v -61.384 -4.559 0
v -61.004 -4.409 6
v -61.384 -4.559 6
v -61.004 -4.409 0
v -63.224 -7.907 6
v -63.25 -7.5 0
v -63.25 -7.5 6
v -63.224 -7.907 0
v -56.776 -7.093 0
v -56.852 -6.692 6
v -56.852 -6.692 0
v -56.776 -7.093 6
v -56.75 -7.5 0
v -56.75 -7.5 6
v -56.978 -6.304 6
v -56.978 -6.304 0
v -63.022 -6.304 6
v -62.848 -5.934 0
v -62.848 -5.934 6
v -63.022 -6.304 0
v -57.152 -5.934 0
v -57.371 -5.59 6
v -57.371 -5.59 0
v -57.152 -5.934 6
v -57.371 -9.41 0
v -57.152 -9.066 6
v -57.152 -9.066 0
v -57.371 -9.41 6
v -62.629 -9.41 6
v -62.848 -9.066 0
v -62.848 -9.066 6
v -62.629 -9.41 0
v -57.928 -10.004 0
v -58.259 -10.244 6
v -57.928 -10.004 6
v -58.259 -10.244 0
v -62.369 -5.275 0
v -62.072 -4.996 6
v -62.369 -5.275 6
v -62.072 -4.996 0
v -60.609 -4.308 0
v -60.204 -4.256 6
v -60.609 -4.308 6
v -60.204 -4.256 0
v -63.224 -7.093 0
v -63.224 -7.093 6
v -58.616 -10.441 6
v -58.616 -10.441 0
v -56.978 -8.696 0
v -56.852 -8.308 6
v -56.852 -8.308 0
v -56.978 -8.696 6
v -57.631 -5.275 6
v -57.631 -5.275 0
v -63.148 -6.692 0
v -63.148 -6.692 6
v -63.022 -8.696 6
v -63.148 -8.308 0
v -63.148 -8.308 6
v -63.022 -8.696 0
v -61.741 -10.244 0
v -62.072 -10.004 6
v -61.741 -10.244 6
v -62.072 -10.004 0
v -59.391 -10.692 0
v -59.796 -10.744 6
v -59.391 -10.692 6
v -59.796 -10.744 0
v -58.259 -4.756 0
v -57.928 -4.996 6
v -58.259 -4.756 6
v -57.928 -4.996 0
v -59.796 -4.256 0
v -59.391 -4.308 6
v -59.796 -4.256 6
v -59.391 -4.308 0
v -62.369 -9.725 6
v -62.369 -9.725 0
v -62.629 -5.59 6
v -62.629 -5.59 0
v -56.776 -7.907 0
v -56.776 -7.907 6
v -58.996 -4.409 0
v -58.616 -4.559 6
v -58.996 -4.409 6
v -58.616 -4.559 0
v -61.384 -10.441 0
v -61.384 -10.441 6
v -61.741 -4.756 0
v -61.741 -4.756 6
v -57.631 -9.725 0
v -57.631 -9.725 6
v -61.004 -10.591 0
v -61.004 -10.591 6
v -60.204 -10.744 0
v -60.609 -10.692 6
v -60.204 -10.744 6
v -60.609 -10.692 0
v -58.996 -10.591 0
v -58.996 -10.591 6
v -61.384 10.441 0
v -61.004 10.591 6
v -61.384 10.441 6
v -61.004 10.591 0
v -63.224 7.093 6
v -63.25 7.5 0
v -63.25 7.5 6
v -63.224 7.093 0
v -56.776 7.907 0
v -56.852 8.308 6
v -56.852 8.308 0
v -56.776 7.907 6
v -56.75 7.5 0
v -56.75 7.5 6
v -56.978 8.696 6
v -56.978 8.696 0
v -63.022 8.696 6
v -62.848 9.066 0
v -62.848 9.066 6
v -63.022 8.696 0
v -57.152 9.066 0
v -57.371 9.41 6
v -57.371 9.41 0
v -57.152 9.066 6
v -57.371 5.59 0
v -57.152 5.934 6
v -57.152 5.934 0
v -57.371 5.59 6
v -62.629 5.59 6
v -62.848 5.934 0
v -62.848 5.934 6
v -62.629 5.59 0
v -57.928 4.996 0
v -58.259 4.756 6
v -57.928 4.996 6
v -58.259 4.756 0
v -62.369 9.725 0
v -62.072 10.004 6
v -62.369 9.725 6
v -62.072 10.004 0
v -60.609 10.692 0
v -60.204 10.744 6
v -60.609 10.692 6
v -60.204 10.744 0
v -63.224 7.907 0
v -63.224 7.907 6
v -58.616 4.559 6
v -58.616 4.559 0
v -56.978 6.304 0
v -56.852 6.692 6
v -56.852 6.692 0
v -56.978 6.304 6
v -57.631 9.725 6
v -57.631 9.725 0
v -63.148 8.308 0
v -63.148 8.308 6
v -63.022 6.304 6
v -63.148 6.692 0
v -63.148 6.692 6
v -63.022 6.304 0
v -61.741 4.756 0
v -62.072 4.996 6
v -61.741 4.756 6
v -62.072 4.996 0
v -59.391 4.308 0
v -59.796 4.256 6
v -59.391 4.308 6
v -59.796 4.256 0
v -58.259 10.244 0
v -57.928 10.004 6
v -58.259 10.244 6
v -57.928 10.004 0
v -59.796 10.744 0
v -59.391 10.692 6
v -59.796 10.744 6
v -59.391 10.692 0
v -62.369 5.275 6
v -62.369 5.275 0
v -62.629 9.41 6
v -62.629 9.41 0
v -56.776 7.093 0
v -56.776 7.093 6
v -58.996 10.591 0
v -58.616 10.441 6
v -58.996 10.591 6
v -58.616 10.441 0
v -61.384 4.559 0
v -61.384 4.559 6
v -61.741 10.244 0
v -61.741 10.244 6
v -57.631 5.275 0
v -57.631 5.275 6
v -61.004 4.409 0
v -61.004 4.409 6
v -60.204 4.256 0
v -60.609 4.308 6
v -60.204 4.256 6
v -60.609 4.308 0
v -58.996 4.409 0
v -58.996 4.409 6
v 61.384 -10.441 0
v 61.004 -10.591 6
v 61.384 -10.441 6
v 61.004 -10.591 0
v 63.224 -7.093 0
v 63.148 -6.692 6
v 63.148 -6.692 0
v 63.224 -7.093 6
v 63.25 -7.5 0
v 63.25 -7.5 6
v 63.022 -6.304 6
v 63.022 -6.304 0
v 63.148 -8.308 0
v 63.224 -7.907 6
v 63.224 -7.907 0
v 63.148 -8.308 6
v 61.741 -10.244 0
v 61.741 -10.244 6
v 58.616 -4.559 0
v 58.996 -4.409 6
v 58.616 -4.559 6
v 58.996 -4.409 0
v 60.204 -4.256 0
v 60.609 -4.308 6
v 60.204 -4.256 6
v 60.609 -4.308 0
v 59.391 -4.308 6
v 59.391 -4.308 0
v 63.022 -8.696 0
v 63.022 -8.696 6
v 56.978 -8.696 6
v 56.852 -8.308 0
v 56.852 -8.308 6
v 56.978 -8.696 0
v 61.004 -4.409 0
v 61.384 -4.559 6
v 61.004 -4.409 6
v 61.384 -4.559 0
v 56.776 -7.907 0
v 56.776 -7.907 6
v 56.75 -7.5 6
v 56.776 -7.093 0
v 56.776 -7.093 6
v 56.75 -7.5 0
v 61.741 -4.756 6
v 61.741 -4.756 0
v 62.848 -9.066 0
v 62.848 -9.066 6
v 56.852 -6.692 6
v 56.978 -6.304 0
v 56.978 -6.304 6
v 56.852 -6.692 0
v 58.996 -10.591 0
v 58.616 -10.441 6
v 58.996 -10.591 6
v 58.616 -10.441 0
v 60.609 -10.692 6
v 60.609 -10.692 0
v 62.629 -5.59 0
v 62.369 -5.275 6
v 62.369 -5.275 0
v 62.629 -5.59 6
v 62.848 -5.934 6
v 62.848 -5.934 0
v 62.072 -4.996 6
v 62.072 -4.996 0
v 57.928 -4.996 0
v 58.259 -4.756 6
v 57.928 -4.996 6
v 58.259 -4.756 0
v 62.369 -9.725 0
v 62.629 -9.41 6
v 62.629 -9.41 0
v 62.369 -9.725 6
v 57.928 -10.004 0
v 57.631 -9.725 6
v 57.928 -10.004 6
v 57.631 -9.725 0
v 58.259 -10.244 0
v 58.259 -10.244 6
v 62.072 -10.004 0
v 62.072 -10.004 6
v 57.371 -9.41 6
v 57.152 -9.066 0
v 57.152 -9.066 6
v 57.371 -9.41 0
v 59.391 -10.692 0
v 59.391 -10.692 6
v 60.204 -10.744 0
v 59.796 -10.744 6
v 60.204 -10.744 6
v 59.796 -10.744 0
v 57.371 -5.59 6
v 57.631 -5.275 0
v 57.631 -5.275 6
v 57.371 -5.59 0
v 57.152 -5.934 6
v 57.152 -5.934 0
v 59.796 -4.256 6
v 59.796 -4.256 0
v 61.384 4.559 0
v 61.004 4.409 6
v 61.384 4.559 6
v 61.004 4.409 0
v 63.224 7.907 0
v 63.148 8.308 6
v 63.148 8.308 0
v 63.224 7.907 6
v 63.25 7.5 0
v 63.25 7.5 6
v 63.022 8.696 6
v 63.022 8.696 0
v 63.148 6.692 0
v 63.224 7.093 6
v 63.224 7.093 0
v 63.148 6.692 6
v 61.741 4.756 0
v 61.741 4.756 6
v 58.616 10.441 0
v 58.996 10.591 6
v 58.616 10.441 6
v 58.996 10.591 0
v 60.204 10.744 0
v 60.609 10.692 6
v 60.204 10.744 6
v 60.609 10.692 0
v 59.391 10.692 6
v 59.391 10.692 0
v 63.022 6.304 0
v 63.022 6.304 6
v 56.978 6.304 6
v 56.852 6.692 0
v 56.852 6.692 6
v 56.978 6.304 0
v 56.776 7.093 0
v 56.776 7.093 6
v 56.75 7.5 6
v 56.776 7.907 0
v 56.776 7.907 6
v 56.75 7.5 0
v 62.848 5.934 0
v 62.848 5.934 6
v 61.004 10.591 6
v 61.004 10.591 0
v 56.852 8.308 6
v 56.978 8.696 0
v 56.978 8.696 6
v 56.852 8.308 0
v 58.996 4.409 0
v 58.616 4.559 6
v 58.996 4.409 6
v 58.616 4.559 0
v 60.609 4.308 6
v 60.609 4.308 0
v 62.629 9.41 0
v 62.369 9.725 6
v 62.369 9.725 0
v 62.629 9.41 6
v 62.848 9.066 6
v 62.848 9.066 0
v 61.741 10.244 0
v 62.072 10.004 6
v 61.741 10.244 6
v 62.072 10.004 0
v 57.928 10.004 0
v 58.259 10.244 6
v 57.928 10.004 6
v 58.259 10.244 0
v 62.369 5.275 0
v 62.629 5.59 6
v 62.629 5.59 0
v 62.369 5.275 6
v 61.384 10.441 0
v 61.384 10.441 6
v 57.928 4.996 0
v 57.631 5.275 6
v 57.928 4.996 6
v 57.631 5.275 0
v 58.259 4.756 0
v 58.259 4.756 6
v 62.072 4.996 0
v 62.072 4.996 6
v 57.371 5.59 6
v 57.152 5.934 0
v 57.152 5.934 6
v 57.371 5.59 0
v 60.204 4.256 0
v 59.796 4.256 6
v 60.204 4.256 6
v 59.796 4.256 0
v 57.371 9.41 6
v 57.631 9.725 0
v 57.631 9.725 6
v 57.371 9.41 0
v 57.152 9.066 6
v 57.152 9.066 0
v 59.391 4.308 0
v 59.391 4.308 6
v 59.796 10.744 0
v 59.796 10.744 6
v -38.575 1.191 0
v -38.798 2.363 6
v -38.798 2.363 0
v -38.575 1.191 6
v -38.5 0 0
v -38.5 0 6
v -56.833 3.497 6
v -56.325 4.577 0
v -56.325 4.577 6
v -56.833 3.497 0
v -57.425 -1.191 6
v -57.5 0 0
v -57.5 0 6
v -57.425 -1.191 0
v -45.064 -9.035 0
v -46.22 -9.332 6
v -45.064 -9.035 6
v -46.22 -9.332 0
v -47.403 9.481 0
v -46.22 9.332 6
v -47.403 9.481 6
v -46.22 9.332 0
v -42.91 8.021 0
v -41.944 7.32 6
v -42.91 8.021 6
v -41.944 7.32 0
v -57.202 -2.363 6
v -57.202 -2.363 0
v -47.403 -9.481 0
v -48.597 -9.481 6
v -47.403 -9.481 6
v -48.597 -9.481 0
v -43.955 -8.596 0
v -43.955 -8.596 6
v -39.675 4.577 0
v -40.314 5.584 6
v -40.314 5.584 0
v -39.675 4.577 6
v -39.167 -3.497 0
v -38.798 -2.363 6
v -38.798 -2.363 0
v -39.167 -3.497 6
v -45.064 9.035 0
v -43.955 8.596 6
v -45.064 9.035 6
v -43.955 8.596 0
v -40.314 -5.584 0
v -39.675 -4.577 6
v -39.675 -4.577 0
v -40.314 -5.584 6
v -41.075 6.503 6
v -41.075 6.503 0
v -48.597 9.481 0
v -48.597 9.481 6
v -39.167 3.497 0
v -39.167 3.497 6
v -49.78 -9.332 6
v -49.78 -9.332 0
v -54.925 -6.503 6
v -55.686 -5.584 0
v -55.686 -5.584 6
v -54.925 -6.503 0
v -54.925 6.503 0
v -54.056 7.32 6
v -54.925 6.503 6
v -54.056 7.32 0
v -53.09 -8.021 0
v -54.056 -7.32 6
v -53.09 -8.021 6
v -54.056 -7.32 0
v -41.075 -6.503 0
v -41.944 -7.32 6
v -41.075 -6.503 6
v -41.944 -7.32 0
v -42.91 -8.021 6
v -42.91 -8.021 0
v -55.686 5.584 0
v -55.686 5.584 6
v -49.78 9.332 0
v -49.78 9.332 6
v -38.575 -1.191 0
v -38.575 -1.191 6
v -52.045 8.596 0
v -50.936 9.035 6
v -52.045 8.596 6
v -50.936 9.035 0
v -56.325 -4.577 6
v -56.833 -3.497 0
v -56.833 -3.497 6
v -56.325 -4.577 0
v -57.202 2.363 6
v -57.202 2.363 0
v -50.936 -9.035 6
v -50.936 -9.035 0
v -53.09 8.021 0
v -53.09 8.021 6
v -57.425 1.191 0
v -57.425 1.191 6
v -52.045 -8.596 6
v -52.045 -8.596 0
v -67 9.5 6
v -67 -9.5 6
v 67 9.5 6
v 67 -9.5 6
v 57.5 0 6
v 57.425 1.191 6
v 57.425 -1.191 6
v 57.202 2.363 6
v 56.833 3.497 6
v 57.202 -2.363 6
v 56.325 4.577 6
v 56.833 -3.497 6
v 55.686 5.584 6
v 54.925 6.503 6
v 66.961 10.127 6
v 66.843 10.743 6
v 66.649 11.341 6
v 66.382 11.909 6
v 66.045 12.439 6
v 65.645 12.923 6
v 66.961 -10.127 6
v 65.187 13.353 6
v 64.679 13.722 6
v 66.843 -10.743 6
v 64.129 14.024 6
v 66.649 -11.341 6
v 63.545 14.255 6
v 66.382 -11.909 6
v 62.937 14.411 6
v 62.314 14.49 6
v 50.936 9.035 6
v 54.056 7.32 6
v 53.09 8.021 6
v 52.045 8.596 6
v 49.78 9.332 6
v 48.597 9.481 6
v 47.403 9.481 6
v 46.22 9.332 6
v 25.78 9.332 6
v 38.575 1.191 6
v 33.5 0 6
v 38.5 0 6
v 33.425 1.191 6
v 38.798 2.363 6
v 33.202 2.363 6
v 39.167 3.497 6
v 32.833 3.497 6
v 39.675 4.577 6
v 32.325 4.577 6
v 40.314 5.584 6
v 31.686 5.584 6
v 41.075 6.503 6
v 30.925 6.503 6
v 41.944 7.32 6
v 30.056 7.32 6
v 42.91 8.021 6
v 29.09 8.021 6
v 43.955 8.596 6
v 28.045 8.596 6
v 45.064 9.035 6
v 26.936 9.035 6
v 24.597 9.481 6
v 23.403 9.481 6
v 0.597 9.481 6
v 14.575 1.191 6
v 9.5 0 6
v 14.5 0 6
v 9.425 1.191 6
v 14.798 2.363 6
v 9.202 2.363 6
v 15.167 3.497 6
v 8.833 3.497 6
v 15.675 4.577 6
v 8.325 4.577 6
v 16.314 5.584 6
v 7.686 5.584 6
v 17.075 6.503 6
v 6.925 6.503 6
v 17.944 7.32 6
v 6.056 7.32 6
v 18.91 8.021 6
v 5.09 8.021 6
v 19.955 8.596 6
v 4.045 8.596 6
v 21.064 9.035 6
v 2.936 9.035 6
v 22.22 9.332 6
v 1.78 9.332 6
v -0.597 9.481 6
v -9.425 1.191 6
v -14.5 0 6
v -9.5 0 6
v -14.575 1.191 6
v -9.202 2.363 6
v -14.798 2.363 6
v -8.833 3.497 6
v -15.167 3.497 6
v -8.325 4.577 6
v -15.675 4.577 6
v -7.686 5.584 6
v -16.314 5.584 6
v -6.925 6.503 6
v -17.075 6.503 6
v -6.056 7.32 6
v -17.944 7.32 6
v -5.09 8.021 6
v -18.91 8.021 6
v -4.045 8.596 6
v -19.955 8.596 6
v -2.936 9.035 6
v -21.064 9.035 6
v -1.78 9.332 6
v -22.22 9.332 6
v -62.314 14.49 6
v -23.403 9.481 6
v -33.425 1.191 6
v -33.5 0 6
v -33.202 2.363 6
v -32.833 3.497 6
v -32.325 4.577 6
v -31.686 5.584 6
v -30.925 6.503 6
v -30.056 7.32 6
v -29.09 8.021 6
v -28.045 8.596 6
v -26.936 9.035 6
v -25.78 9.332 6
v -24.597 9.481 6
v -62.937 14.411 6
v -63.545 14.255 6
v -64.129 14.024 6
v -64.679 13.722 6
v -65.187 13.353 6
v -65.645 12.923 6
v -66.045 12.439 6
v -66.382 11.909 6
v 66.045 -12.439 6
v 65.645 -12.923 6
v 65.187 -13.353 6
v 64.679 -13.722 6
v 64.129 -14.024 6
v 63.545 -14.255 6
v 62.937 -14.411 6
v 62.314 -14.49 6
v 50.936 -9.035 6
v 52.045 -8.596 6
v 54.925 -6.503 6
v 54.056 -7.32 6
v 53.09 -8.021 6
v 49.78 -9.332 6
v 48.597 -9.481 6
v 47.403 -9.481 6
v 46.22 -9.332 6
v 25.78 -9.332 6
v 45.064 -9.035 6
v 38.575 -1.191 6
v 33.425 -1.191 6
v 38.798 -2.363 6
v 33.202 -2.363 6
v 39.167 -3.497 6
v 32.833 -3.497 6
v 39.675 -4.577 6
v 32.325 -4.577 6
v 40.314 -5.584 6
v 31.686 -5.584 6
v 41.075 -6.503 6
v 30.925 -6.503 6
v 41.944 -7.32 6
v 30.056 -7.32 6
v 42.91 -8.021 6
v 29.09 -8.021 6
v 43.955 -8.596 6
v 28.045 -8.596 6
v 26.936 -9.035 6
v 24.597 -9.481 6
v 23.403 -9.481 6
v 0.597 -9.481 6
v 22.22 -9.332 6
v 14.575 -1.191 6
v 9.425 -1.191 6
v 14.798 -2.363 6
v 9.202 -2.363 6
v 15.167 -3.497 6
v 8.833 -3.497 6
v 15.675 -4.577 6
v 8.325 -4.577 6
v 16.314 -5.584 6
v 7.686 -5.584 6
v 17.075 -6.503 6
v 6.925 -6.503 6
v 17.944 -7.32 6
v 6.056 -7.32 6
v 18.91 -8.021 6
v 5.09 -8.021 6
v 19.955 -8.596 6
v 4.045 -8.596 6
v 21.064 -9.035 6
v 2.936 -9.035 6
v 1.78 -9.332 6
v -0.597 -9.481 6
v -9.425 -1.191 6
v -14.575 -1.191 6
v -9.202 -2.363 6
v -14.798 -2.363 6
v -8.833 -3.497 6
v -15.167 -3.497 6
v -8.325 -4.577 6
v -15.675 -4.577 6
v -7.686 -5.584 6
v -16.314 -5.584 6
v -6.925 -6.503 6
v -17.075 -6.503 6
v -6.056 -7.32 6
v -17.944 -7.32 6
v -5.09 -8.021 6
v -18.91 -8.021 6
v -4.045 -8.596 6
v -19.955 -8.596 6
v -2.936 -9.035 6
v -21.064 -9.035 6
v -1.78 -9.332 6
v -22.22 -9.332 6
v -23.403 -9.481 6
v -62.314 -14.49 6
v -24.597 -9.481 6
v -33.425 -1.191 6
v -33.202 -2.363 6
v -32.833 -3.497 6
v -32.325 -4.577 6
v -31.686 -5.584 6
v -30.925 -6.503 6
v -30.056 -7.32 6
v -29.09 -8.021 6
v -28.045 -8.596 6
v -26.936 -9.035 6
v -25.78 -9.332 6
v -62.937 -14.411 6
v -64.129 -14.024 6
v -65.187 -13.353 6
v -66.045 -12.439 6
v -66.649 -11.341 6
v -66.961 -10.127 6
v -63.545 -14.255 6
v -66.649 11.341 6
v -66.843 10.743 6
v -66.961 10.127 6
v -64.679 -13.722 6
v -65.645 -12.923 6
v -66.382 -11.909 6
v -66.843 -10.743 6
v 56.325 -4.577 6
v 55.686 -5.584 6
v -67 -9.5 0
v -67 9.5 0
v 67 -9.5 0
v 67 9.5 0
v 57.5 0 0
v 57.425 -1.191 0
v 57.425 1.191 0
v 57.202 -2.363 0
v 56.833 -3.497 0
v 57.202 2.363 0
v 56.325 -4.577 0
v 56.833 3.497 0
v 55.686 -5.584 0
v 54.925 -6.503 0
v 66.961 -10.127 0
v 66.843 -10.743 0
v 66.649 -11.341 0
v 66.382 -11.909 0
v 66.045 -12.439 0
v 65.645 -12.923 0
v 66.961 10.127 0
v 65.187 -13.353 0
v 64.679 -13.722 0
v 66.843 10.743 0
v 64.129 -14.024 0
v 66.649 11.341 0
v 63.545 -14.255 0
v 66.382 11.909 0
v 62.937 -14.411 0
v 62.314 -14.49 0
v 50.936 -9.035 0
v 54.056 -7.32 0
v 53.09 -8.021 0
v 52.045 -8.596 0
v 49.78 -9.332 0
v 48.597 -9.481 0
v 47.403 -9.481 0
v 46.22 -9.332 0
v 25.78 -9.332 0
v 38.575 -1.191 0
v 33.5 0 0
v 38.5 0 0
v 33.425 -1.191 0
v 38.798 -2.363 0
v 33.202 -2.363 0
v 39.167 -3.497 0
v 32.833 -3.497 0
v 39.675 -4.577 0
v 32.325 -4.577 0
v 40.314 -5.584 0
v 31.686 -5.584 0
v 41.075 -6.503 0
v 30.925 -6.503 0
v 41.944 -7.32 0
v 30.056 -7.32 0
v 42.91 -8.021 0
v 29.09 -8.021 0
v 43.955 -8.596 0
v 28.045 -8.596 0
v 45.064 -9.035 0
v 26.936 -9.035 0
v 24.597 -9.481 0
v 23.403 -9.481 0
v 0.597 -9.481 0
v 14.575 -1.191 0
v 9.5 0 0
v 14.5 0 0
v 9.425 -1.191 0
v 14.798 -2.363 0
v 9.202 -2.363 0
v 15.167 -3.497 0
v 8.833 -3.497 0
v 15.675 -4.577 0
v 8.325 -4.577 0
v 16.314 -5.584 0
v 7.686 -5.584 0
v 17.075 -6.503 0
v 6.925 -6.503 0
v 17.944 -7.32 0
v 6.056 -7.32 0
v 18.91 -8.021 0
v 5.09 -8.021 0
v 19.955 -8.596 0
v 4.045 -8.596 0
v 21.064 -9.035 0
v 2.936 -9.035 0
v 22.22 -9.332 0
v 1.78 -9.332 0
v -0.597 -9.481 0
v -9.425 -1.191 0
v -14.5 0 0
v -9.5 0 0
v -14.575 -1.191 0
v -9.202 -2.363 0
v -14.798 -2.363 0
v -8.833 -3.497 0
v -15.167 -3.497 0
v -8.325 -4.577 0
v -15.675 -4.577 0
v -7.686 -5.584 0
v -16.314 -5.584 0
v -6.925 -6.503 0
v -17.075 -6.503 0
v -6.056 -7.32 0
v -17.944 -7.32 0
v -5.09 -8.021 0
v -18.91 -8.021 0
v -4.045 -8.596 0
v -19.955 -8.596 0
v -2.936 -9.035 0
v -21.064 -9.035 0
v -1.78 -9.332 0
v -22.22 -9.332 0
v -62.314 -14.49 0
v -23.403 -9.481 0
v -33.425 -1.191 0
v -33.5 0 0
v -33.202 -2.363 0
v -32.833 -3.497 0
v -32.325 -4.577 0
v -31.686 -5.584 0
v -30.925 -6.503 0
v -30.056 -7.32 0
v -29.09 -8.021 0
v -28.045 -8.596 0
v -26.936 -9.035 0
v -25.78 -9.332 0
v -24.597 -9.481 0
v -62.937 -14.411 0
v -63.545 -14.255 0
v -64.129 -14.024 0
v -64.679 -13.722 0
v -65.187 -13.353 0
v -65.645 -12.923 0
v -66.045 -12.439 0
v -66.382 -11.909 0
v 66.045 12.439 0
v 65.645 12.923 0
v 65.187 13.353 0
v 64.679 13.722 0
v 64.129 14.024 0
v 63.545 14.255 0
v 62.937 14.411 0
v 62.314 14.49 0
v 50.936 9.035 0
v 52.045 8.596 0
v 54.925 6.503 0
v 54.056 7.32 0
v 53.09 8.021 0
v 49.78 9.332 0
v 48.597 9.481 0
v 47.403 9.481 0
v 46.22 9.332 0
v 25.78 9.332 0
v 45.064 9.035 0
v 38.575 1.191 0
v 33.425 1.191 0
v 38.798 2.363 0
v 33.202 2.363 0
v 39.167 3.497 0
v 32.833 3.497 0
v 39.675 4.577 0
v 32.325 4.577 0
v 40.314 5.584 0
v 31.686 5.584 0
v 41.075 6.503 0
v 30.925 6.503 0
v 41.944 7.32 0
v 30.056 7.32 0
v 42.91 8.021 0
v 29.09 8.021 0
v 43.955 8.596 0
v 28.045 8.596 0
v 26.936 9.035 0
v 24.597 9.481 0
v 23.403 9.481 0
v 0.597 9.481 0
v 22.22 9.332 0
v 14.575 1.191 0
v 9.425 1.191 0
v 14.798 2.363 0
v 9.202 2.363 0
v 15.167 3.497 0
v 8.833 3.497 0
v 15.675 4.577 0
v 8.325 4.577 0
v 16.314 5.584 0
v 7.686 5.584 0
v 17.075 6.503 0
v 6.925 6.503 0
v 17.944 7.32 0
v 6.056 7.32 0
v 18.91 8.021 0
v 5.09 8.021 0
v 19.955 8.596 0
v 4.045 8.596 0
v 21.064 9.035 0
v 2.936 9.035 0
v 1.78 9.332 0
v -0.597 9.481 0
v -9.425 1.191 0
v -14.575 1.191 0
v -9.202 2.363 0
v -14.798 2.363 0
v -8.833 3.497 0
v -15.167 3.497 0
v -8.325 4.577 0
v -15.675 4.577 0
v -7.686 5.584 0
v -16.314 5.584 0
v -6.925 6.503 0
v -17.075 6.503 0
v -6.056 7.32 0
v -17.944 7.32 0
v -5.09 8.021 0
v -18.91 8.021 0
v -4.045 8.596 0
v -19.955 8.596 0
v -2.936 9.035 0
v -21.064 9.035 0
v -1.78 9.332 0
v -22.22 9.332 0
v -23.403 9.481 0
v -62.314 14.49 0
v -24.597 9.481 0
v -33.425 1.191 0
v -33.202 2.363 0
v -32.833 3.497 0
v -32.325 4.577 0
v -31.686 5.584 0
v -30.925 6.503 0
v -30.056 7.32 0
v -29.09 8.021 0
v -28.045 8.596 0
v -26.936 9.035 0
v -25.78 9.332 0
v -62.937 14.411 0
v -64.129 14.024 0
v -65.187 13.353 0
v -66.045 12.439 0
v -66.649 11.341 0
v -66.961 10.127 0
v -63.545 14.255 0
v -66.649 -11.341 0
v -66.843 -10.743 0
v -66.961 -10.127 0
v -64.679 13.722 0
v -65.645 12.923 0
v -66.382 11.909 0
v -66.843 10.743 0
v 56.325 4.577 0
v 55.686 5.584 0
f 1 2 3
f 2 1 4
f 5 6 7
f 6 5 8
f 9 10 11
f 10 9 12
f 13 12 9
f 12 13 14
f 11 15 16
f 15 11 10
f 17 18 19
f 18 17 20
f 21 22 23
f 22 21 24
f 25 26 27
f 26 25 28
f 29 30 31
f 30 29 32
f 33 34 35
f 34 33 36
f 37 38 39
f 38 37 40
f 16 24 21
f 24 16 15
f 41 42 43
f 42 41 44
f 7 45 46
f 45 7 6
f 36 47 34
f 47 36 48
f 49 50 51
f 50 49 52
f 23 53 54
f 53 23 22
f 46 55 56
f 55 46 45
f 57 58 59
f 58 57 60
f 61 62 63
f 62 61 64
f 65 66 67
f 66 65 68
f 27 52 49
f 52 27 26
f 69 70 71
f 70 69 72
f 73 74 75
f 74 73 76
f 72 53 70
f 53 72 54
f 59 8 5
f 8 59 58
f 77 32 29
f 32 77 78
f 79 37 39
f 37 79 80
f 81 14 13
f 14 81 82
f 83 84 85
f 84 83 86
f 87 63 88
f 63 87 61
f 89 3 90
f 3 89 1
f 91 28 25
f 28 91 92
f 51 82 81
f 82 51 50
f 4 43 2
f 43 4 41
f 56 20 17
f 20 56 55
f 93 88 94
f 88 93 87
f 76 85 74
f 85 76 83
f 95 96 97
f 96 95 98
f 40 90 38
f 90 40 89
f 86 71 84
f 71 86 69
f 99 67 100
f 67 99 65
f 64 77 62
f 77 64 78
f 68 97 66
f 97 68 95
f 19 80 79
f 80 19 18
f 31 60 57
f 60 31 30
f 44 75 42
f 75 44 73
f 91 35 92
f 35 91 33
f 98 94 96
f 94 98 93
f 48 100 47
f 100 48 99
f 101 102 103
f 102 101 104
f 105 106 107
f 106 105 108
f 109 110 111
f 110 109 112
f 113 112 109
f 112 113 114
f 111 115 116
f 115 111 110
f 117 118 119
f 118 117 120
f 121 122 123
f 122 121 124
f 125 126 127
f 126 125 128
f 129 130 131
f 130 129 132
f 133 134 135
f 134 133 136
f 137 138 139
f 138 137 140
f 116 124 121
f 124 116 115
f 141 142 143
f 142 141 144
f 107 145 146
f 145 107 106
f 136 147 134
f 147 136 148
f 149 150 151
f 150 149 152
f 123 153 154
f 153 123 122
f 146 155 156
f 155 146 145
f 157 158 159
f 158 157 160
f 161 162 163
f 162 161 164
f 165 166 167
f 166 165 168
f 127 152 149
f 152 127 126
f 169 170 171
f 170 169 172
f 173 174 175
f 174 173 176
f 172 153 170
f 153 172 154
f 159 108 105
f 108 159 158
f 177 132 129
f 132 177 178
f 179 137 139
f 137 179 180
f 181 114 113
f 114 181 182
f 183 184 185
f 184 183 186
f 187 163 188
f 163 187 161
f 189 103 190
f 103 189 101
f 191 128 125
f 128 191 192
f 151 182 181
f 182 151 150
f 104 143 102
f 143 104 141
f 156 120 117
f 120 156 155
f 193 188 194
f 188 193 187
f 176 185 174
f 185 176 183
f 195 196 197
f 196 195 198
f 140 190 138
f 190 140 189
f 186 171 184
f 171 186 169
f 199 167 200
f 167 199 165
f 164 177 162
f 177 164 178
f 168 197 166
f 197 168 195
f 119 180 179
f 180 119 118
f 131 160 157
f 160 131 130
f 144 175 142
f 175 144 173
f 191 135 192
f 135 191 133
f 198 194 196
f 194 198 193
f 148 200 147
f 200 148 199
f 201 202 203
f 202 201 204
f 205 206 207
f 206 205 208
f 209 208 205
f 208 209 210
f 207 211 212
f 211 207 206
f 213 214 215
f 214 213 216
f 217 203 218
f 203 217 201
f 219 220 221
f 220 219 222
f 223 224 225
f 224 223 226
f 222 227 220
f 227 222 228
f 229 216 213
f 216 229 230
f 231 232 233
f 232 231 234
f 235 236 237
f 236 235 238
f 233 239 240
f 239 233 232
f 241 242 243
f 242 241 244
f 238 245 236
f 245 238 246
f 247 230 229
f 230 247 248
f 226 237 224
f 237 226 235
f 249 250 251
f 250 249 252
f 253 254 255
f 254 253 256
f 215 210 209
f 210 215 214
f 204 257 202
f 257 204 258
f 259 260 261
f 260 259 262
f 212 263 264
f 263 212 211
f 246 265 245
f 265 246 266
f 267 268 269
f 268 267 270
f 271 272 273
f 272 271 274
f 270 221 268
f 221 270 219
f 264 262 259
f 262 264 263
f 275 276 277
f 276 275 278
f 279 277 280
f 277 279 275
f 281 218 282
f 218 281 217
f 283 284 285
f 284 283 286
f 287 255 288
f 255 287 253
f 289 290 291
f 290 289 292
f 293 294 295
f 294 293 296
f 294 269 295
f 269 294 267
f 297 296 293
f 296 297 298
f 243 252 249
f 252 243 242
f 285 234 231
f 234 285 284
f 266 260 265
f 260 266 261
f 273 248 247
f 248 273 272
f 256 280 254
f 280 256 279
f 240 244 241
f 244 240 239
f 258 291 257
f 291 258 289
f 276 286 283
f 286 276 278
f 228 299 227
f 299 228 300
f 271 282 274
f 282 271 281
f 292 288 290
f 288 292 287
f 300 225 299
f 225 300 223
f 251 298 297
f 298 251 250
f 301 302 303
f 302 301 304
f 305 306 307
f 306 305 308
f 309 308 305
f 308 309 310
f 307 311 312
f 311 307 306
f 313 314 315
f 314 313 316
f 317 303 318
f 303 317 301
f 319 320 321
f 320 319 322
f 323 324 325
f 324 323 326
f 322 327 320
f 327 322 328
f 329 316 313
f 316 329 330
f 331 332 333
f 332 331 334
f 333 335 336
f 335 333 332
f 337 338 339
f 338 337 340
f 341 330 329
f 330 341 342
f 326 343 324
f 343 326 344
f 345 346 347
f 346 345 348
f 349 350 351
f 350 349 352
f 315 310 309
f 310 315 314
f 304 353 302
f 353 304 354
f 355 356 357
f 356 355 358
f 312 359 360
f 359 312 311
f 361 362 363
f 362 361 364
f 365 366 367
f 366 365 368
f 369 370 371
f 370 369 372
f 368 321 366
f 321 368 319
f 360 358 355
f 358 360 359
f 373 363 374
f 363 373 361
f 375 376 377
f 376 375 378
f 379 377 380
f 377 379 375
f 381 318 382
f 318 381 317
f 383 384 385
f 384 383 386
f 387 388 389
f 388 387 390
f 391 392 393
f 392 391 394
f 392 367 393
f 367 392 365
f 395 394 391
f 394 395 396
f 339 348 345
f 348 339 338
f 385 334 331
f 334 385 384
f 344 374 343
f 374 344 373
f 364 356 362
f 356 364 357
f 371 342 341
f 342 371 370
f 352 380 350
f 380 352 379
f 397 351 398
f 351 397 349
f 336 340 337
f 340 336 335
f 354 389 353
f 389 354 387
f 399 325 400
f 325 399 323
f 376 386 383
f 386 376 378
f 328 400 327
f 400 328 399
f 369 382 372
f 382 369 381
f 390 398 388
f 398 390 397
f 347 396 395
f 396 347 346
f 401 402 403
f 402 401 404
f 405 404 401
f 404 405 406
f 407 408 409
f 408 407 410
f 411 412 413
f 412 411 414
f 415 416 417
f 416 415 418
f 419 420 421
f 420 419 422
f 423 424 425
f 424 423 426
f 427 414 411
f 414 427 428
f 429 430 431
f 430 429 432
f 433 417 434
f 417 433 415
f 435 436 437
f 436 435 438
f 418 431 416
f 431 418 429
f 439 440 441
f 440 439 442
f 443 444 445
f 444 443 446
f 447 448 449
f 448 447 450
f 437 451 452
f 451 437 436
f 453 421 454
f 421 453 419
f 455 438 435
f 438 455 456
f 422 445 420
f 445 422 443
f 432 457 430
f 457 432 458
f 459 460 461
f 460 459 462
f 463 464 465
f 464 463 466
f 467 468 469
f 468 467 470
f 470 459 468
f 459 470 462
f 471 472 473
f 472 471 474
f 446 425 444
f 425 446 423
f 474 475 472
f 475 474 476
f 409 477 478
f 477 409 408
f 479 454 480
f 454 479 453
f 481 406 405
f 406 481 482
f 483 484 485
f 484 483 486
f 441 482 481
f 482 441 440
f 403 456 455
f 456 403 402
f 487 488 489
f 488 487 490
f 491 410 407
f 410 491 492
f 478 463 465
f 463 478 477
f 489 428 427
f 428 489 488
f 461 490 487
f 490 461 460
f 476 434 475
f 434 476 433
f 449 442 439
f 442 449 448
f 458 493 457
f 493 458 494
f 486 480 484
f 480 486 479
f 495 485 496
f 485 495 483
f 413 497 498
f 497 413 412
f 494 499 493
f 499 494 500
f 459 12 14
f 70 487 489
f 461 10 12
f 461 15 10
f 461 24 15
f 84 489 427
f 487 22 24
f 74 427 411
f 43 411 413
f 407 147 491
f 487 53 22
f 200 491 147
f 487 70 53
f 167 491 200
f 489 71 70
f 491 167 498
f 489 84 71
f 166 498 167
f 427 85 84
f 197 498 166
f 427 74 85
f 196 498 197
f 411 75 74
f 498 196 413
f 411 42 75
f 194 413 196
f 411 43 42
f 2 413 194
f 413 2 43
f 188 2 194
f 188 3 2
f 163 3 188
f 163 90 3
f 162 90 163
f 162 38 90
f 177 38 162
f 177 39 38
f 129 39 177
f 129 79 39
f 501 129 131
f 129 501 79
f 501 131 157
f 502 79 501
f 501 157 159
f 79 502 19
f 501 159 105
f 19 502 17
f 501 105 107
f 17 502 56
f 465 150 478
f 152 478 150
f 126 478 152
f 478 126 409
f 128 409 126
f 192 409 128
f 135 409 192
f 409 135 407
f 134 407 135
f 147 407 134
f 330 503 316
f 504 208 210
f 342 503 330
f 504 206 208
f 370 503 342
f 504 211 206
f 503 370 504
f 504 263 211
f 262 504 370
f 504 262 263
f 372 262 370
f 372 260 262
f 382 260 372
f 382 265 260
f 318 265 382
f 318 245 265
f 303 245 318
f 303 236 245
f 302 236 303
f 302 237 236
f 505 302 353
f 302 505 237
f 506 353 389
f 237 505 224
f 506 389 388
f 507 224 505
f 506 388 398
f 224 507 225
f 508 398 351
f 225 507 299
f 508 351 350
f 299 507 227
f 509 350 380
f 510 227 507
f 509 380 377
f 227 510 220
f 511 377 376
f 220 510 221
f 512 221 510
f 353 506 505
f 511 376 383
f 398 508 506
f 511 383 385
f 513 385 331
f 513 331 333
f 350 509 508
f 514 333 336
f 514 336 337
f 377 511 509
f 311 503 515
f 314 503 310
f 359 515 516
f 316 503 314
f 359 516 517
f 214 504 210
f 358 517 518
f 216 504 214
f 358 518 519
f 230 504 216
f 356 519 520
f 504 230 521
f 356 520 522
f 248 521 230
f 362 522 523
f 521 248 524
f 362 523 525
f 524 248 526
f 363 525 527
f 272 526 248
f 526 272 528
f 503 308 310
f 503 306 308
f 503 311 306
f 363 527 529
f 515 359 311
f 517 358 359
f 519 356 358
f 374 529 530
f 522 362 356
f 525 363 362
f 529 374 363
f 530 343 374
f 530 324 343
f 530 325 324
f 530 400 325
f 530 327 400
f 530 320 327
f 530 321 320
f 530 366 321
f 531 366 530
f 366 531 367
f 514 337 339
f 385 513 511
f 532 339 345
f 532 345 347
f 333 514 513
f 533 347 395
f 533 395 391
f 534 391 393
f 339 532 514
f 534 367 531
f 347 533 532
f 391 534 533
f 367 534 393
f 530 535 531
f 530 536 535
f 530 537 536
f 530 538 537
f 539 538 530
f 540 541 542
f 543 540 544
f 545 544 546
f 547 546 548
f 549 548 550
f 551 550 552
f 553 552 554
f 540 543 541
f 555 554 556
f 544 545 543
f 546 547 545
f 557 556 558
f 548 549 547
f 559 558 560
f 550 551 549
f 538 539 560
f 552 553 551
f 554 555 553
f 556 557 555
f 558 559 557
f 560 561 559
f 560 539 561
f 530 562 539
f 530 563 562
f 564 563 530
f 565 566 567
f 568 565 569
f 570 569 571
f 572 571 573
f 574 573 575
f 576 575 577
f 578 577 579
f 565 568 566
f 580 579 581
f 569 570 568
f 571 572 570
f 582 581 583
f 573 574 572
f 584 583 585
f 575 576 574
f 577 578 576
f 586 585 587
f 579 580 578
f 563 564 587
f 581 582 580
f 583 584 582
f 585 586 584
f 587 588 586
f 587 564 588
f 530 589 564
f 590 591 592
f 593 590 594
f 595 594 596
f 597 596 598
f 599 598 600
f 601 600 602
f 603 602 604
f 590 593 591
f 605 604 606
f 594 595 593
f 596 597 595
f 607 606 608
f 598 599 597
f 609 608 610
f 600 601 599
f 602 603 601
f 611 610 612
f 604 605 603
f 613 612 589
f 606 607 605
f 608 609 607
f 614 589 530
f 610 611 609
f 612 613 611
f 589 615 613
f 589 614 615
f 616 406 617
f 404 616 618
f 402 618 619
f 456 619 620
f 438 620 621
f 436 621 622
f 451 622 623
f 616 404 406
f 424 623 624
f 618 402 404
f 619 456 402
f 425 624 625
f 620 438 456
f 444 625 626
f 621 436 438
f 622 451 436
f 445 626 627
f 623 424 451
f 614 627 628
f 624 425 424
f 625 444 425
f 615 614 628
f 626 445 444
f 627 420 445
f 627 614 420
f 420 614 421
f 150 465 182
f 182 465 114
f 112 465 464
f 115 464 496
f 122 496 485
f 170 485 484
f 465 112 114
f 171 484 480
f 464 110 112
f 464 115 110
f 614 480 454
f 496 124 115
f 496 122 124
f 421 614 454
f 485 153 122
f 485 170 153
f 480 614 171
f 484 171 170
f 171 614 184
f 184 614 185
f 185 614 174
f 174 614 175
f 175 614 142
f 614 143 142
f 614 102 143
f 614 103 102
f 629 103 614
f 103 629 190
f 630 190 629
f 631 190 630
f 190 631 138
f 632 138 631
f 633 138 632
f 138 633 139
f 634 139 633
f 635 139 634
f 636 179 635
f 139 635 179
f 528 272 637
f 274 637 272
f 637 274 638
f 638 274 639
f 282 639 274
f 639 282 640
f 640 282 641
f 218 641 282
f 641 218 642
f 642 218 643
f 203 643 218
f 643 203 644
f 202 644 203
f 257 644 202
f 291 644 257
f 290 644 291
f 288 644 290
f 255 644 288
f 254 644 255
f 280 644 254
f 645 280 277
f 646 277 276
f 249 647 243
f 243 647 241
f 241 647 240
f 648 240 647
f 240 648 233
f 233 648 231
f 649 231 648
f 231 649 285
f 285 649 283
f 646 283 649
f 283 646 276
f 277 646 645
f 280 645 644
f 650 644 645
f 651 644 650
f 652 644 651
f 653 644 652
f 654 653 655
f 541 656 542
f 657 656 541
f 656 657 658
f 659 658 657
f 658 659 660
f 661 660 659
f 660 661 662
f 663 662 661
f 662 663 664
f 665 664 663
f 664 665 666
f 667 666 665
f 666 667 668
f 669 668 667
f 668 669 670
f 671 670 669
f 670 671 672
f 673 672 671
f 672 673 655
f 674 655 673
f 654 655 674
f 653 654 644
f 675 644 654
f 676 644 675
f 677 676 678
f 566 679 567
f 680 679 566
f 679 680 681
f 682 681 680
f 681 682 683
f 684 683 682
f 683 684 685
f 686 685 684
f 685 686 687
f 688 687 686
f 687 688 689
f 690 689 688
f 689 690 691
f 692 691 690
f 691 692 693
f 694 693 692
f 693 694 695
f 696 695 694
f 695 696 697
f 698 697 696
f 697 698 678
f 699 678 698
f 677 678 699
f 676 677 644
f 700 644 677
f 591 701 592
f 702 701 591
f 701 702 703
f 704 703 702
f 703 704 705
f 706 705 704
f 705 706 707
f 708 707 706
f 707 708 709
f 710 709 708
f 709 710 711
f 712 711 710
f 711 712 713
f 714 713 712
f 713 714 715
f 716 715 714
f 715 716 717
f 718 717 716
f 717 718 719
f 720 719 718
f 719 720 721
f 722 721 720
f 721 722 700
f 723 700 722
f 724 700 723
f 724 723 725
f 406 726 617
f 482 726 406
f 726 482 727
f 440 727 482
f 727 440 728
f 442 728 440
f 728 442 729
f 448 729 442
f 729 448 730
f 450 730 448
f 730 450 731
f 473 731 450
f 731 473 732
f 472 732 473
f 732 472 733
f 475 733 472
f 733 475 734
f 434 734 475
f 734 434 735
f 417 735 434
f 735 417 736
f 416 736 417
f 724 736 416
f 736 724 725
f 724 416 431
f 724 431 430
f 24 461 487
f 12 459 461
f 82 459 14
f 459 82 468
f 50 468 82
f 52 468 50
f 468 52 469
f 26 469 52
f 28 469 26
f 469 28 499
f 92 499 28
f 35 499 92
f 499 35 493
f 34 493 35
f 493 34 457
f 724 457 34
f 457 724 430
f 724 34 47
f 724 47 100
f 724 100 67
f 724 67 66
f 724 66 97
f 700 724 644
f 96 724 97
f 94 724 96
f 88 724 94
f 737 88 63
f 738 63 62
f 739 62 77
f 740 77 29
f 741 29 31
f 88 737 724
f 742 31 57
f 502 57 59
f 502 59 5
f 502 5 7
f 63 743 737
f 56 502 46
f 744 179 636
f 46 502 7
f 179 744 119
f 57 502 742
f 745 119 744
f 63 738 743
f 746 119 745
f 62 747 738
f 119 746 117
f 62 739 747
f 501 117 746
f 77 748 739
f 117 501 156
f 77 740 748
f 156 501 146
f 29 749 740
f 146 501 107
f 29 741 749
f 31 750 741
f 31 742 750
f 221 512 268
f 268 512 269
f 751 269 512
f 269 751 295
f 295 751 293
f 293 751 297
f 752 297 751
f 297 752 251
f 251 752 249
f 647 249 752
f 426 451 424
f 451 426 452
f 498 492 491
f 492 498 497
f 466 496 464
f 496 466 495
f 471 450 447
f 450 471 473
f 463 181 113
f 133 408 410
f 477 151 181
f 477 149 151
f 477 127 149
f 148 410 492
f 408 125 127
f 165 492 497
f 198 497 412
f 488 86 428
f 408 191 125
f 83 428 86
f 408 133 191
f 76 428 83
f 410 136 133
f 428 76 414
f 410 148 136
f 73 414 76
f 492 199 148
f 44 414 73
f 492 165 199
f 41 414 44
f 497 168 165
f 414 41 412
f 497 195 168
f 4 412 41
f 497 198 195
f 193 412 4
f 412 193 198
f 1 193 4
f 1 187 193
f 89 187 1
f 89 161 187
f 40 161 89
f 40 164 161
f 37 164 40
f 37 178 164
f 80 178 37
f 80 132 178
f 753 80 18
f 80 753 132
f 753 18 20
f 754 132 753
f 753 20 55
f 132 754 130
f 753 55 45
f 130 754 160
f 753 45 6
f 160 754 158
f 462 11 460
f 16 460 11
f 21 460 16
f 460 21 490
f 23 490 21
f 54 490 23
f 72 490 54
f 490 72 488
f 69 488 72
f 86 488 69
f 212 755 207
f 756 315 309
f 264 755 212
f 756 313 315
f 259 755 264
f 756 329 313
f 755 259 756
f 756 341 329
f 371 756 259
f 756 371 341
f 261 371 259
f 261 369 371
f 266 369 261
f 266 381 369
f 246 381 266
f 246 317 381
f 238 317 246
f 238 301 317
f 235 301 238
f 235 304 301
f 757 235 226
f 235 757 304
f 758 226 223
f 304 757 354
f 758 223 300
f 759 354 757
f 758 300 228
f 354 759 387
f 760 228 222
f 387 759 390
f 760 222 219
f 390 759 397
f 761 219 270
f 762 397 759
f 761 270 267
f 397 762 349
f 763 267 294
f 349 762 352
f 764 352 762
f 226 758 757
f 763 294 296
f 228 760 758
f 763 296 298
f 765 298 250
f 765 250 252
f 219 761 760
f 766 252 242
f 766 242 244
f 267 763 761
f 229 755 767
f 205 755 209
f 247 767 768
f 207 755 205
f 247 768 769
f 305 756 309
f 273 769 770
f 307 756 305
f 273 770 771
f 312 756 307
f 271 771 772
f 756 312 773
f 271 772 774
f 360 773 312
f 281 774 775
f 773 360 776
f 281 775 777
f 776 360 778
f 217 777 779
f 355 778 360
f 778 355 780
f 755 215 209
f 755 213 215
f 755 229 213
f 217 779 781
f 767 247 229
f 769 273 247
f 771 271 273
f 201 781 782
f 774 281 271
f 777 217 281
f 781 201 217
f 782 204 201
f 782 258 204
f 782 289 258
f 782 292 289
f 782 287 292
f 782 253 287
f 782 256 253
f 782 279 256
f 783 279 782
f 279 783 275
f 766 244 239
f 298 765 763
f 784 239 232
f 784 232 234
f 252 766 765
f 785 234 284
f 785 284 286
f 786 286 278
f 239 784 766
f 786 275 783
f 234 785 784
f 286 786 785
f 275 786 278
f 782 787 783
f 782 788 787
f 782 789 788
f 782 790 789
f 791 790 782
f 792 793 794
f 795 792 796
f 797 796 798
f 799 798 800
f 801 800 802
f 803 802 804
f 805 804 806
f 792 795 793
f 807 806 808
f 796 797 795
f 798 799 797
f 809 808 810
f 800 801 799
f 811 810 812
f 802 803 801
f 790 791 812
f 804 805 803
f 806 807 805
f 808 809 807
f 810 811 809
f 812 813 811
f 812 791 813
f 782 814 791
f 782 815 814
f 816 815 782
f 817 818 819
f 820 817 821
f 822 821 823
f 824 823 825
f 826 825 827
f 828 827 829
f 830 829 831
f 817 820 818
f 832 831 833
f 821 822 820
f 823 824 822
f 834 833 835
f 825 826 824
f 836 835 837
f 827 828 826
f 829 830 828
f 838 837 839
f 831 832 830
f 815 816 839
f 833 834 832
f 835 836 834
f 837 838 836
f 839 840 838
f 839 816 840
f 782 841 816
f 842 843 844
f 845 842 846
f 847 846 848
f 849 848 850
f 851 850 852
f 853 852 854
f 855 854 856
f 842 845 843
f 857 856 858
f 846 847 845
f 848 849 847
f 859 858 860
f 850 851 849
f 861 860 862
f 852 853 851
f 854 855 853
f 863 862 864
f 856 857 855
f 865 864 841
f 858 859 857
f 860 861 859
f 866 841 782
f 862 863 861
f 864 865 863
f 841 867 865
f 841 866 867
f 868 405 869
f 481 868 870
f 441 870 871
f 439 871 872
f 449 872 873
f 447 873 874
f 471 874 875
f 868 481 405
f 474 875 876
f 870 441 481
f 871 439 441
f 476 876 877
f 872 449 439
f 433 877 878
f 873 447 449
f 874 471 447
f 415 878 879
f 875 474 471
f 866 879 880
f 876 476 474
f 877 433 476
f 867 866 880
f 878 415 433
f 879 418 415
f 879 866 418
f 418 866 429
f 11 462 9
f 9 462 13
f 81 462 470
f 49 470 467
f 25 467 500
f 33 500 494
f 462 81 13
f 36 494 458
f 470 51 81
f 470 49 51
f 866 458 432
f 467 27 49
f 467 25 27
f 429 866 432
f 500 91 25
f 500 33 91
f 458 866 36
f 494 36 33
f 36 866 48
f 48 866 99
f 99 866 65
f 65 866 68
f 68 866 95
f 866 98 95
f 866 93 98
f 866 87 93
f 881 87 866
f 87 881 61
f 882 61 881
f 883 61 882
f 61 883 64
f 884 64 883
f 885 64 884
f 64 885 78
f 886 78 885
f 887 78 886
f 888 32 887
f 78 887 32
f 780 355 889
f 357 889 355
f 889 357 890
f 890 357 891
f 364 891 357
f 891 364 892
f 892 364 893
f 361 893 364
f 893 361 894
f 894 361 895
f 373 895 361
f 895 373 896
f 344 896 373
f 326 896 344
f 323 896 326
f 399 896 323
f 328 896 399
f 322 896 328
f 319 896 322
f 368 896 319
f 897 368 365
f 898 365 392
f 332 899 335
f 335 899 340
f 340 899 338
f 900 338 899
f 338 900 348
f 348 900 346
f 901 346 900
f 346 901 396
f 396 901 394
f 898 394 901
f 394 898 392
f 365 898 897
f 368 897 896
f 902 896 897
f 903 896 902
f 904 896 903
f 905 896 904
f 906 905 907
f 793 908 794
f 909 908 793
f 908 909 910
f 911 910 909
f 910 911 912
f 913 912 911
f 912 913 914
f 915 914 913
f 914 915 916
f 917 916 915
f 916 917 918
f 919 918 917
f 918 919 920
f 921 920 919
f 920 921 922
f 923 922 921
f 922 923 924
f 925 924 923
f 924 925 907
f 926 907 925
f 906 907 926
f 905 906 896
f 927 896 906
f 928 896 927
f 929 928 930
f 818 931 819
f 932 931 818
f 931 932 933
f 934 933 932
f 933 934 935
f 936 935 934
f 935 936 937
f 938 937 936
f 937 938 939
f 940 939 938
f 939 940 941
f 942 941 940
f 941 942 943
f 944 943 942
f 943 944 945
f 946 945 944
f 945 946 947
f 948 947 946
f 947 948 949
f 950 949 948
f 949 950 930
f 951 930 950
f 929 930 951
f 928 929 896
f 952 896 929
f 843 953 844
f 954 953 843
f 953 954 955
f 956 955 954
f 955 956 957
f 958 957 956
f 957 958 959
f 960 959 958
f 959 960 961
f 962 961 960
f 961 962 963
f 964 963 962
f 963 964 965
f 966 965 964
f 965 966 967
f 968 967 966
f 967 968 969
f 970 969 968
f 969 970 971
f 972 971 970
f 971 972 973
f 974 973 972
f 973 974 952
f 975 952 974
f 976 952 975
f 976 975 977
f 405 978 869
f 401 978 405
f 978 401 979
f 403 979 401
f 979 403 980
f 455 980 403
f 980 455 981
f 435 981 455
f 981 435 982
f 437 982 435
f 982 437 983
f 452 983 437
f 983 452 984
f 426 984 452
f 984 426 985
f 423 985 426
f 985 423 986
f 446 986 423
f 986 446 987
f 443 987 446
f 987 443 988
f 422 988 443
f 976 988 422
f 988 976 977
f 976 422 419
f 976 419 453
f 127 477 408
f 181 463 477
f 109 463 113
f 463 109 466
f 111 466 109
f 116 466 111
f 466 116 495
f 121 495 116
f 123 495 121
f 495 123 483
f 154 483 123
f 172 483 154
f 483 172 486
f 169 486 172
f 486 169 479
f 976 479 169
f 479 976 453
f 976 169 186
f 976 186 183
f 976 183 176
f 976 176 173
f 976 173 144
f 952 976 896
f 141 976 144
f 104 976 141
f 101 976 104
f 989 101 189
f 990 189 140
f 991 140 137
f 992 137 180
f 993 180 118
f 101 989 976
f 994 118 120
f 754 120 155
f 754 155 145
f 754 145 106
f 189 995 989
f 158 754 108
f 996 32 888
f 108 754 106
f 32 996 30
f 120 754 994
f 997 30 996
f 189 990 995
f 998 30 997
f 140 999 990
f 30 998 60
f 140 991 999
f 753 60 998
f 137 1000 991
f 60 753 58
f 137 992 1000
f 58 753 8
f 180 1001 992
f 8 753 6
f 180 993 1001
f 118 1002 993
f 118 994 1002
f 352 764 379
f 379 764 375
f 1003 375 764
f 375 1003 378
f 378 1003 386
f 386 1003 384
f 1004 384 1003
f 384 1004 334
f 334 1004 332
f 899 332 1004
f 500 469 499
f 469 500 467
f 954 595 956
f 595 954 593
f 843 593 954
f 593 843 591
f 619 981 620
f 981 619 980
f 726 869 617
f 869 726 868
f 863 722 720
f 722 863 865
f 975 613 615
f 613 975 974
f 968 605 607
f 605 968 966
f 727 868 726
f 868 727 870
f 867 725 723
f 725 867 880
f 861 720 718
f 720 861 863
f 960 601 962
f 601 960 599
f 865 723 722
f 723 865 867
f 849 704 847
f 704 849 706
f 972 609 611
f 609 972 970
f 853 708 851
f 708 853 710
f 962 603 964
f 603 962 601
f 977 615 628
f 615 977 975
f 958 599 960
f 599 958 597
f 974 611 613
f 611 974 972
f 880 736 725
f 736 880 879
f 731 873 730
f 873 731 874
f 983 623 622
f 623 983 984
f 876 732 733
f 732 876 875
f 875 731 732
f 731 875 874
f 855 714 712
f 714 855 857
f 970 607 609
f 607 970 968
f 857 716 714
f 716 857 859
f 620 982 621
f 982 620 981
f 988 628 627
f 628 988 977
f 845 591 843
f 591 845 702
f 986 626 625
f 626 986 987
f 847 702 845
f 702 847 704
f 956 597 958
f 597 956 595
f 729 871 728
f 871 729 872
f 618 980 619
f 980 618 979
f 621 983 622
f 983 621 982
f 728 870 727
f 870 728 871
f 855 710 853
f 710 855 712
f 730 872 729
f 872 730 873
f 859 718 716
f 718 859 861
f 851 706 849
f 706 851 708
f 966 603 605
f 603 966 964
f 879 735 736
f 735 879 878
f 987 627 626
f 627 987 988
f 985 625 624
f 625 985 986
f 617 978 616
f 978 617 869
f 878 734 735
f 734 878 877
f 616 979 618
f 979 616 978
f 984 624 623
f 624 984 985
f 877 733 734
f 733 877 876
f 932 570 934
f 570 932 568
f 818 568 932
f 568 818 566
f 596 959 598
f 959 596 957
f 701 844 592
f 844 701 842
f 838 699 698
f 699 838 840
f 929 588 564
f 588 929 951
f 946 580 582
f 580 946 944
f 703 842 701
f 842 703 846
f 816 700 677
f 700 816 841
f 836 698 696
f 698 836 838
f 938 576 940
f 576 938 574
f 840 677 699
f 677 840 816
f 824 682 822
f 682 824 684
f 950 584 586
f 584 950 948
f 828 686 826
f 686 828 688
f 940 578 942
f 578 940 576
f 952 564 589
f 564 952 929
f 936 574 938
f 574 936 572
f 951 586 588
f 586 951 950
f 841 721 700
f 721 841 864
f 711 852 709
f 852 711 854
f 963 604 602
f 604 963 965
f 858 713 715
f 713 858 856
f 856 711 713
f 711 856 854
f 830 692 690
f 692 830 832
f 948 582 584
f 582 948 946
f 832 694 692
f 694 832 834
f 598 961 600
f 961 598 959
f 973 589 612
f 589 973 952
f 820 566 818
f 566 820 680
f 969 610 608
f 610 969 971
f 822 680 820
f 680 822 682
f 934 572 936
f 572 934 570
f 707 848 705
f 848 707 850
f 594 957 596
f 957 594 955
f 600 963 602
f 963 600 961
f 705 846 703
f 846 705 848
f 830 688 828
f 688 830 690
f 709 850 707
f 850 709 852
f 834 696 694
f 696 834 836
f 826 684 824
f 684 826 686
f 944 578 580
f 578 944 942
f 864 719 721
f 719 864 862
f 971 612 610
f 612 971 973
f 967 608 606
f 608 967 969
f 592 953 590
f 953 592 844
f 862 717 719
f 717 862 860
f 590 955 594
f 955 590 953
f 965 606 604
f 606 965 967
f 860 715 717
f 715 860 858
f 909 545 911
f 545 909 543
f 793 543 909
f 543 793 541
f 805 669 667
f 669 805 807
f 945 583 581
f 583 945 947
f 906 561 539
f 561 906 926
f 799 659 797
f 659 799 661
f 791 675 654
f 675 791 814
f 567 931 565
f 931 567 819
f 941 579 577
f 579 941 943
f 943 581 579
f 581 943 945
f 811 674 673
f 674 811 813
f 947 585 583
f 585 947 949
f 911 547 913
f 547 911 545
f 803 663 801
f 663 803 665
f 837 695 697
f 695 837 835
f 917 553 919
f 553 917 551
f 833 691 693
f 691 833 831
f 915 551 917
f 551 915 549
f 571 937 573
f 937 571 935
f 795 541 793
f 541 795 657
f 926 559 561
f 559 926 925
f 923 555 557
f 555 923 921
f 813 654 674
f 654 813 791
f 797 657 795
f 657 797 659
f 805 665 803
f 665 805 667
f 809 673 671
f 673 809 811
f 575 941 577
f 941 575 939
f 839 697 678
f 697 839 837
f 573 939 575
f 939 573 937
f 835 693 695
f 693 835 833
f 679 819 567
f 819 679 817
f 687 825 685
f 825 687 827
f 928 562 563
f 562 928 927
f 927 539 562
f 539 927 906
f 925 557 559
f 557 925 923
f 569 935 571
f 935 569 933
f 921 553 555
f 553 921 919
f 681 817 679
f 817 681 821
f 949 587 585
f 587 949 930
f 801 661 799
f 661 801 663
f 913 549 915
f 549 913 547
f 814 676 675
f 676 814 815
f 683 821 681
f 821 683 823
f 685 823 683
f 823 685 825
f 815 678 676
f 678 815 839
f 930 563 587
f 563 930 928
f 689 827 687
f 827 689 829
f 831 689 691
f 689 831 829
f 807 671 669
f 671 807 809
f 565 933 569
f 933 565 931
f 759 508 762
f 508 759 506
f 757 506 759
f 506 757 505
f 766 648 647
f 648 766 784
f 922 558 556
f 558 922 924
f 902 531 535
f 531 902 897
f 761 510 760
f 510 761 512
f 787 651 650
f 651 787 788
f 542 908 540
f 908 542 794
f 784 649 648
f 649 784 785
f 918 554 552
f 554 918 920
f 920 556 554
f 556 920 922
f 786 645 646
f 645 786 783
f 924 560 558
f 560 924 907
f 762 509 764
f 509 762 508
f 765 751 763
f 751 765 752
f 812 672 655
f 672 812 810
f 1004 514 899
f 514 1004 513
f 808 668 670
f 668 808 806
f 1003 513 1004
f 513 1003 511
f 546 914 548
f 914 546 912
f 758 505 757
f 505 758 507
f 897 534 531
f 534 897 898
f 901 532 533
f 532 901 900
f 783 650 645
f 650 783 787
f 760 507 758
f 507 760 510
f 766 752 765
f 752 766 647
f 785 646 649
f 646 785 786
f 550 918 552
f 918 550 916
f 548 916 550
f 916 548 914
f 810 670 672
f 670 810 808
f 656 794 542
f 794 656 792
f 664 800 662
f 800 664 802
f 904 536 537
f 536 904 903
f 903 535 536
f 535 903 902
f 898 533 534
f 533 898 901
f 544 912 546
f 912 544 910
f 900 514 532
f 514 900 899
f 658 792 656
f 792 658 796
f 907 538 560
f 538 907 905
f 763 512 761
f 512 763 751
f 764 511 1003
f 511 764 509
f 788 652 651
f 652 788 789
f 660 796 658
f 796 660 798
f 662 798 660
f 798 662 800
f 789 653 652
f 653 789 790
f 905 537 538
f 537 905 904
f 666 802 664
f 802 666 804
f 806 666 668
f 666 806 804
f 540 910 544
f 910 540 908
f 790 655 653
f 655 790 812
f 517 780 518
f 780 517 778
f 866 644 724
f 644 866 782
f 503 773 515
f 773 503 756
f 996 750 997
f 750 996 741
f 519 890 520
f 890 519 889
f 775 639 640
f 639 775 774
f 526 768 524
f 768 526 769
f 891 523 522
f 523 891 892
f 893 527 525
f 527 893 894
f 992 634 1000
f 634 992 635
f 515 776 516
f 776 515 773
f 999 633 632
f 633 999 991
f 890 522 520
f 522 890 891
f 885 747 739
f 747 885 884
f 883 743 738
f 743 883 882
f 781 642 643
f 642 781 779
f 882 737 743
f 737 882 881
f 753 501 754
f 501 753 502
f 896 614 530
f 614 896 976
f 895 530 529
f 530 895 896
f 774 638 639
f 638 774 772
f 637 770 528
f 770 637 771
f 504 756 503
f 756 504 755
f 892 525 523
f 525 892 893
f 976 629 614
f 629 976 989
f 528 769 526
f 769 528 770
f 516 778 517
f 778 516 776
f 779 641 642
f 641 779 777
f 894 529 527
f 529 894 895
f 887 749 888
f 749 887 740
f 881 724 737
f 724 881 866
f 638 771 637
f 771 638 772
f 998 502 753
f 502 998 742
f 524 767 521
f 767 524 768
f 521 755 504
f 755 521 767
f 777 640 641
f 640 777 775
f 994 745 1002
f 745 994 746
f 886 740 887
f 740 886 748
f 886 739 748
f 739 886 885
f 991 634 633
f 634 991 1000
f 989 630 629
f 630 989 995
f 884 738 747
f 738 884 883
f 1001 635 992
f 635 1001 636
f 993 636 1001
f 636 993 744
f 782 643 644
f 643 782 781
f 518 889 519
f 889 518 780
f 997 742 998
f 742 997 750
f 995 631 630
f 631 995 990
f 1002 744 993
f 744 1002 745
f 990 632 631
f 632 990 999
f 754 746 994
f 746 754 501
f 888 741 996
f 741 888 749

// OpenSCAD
$fn = 50;

difference() {
	union() {
		hull() {
			translate(v = [-62.0, 9.5, 0]) {
				cylinder(h = 6, r = 5);
			}
			translate(v = [62.0, 9.5, 0]) {
				cylinder(h = 6, r = 5);
			}
			translate(v = [-62.0, -9.5, 0]) {
				cylinder(h = 6, r = 5);
			}
			translate(v = [62.0, -9.5, 0]) {
				cylinder(h = 6, r = 5);
			}
		}
	}
	union() {
		translate(v = [-60.0, -7.5, -100.0]) {
			cylinder(h = 200, r = 3.25);
		}
		translate(v = [-60.0, 7.5, -100.0]) {
			cylinder(h = 200, r = 3.25);
		}
		translate(v = [60.0, -7.5, -100.0]) {
			cylinder(h = 200, r = 3.25);
		}
		translate(v = [60.0, 7.5, -100.0]) {
			cylinder(h = 200, r = 3.25);
		}
		translate(v = [-60.0, -7.5, -100.0]) {
			cylinder(h = 200, r = 1.8);
		}
		translate(v = [-60.0, 7.5, -100.0]) {
			cylinder(h = 200, r = 1.8);
		}
		translate(v = [60.0, -7.5, -100.0]) {
			cylinder(h = 200, r = 1.8);
		}
		translate(v = [60.0, 7.5, -100.0]) {
			cylinder(h = 200, r = 1.8);
		}
		translate(v = [-48.0, 0, 0.0]) {
			cylinder(h = 6, r = 9.5);
		}
		translate(v = [-24.0, 0, 0.0]) {
			cylinder(h = 6, r = 9.5);
		}
		cylinder(h = 6, r = 9.5);
		translate(v = [24.0, 0, 0.0]) {
			cylinder(h = 6, r = 9.5);
		}
		translate(v = [48.0, 0, 0.0]) {
			cylinder(h = 6, r = 9.5);
		}
	}
}
